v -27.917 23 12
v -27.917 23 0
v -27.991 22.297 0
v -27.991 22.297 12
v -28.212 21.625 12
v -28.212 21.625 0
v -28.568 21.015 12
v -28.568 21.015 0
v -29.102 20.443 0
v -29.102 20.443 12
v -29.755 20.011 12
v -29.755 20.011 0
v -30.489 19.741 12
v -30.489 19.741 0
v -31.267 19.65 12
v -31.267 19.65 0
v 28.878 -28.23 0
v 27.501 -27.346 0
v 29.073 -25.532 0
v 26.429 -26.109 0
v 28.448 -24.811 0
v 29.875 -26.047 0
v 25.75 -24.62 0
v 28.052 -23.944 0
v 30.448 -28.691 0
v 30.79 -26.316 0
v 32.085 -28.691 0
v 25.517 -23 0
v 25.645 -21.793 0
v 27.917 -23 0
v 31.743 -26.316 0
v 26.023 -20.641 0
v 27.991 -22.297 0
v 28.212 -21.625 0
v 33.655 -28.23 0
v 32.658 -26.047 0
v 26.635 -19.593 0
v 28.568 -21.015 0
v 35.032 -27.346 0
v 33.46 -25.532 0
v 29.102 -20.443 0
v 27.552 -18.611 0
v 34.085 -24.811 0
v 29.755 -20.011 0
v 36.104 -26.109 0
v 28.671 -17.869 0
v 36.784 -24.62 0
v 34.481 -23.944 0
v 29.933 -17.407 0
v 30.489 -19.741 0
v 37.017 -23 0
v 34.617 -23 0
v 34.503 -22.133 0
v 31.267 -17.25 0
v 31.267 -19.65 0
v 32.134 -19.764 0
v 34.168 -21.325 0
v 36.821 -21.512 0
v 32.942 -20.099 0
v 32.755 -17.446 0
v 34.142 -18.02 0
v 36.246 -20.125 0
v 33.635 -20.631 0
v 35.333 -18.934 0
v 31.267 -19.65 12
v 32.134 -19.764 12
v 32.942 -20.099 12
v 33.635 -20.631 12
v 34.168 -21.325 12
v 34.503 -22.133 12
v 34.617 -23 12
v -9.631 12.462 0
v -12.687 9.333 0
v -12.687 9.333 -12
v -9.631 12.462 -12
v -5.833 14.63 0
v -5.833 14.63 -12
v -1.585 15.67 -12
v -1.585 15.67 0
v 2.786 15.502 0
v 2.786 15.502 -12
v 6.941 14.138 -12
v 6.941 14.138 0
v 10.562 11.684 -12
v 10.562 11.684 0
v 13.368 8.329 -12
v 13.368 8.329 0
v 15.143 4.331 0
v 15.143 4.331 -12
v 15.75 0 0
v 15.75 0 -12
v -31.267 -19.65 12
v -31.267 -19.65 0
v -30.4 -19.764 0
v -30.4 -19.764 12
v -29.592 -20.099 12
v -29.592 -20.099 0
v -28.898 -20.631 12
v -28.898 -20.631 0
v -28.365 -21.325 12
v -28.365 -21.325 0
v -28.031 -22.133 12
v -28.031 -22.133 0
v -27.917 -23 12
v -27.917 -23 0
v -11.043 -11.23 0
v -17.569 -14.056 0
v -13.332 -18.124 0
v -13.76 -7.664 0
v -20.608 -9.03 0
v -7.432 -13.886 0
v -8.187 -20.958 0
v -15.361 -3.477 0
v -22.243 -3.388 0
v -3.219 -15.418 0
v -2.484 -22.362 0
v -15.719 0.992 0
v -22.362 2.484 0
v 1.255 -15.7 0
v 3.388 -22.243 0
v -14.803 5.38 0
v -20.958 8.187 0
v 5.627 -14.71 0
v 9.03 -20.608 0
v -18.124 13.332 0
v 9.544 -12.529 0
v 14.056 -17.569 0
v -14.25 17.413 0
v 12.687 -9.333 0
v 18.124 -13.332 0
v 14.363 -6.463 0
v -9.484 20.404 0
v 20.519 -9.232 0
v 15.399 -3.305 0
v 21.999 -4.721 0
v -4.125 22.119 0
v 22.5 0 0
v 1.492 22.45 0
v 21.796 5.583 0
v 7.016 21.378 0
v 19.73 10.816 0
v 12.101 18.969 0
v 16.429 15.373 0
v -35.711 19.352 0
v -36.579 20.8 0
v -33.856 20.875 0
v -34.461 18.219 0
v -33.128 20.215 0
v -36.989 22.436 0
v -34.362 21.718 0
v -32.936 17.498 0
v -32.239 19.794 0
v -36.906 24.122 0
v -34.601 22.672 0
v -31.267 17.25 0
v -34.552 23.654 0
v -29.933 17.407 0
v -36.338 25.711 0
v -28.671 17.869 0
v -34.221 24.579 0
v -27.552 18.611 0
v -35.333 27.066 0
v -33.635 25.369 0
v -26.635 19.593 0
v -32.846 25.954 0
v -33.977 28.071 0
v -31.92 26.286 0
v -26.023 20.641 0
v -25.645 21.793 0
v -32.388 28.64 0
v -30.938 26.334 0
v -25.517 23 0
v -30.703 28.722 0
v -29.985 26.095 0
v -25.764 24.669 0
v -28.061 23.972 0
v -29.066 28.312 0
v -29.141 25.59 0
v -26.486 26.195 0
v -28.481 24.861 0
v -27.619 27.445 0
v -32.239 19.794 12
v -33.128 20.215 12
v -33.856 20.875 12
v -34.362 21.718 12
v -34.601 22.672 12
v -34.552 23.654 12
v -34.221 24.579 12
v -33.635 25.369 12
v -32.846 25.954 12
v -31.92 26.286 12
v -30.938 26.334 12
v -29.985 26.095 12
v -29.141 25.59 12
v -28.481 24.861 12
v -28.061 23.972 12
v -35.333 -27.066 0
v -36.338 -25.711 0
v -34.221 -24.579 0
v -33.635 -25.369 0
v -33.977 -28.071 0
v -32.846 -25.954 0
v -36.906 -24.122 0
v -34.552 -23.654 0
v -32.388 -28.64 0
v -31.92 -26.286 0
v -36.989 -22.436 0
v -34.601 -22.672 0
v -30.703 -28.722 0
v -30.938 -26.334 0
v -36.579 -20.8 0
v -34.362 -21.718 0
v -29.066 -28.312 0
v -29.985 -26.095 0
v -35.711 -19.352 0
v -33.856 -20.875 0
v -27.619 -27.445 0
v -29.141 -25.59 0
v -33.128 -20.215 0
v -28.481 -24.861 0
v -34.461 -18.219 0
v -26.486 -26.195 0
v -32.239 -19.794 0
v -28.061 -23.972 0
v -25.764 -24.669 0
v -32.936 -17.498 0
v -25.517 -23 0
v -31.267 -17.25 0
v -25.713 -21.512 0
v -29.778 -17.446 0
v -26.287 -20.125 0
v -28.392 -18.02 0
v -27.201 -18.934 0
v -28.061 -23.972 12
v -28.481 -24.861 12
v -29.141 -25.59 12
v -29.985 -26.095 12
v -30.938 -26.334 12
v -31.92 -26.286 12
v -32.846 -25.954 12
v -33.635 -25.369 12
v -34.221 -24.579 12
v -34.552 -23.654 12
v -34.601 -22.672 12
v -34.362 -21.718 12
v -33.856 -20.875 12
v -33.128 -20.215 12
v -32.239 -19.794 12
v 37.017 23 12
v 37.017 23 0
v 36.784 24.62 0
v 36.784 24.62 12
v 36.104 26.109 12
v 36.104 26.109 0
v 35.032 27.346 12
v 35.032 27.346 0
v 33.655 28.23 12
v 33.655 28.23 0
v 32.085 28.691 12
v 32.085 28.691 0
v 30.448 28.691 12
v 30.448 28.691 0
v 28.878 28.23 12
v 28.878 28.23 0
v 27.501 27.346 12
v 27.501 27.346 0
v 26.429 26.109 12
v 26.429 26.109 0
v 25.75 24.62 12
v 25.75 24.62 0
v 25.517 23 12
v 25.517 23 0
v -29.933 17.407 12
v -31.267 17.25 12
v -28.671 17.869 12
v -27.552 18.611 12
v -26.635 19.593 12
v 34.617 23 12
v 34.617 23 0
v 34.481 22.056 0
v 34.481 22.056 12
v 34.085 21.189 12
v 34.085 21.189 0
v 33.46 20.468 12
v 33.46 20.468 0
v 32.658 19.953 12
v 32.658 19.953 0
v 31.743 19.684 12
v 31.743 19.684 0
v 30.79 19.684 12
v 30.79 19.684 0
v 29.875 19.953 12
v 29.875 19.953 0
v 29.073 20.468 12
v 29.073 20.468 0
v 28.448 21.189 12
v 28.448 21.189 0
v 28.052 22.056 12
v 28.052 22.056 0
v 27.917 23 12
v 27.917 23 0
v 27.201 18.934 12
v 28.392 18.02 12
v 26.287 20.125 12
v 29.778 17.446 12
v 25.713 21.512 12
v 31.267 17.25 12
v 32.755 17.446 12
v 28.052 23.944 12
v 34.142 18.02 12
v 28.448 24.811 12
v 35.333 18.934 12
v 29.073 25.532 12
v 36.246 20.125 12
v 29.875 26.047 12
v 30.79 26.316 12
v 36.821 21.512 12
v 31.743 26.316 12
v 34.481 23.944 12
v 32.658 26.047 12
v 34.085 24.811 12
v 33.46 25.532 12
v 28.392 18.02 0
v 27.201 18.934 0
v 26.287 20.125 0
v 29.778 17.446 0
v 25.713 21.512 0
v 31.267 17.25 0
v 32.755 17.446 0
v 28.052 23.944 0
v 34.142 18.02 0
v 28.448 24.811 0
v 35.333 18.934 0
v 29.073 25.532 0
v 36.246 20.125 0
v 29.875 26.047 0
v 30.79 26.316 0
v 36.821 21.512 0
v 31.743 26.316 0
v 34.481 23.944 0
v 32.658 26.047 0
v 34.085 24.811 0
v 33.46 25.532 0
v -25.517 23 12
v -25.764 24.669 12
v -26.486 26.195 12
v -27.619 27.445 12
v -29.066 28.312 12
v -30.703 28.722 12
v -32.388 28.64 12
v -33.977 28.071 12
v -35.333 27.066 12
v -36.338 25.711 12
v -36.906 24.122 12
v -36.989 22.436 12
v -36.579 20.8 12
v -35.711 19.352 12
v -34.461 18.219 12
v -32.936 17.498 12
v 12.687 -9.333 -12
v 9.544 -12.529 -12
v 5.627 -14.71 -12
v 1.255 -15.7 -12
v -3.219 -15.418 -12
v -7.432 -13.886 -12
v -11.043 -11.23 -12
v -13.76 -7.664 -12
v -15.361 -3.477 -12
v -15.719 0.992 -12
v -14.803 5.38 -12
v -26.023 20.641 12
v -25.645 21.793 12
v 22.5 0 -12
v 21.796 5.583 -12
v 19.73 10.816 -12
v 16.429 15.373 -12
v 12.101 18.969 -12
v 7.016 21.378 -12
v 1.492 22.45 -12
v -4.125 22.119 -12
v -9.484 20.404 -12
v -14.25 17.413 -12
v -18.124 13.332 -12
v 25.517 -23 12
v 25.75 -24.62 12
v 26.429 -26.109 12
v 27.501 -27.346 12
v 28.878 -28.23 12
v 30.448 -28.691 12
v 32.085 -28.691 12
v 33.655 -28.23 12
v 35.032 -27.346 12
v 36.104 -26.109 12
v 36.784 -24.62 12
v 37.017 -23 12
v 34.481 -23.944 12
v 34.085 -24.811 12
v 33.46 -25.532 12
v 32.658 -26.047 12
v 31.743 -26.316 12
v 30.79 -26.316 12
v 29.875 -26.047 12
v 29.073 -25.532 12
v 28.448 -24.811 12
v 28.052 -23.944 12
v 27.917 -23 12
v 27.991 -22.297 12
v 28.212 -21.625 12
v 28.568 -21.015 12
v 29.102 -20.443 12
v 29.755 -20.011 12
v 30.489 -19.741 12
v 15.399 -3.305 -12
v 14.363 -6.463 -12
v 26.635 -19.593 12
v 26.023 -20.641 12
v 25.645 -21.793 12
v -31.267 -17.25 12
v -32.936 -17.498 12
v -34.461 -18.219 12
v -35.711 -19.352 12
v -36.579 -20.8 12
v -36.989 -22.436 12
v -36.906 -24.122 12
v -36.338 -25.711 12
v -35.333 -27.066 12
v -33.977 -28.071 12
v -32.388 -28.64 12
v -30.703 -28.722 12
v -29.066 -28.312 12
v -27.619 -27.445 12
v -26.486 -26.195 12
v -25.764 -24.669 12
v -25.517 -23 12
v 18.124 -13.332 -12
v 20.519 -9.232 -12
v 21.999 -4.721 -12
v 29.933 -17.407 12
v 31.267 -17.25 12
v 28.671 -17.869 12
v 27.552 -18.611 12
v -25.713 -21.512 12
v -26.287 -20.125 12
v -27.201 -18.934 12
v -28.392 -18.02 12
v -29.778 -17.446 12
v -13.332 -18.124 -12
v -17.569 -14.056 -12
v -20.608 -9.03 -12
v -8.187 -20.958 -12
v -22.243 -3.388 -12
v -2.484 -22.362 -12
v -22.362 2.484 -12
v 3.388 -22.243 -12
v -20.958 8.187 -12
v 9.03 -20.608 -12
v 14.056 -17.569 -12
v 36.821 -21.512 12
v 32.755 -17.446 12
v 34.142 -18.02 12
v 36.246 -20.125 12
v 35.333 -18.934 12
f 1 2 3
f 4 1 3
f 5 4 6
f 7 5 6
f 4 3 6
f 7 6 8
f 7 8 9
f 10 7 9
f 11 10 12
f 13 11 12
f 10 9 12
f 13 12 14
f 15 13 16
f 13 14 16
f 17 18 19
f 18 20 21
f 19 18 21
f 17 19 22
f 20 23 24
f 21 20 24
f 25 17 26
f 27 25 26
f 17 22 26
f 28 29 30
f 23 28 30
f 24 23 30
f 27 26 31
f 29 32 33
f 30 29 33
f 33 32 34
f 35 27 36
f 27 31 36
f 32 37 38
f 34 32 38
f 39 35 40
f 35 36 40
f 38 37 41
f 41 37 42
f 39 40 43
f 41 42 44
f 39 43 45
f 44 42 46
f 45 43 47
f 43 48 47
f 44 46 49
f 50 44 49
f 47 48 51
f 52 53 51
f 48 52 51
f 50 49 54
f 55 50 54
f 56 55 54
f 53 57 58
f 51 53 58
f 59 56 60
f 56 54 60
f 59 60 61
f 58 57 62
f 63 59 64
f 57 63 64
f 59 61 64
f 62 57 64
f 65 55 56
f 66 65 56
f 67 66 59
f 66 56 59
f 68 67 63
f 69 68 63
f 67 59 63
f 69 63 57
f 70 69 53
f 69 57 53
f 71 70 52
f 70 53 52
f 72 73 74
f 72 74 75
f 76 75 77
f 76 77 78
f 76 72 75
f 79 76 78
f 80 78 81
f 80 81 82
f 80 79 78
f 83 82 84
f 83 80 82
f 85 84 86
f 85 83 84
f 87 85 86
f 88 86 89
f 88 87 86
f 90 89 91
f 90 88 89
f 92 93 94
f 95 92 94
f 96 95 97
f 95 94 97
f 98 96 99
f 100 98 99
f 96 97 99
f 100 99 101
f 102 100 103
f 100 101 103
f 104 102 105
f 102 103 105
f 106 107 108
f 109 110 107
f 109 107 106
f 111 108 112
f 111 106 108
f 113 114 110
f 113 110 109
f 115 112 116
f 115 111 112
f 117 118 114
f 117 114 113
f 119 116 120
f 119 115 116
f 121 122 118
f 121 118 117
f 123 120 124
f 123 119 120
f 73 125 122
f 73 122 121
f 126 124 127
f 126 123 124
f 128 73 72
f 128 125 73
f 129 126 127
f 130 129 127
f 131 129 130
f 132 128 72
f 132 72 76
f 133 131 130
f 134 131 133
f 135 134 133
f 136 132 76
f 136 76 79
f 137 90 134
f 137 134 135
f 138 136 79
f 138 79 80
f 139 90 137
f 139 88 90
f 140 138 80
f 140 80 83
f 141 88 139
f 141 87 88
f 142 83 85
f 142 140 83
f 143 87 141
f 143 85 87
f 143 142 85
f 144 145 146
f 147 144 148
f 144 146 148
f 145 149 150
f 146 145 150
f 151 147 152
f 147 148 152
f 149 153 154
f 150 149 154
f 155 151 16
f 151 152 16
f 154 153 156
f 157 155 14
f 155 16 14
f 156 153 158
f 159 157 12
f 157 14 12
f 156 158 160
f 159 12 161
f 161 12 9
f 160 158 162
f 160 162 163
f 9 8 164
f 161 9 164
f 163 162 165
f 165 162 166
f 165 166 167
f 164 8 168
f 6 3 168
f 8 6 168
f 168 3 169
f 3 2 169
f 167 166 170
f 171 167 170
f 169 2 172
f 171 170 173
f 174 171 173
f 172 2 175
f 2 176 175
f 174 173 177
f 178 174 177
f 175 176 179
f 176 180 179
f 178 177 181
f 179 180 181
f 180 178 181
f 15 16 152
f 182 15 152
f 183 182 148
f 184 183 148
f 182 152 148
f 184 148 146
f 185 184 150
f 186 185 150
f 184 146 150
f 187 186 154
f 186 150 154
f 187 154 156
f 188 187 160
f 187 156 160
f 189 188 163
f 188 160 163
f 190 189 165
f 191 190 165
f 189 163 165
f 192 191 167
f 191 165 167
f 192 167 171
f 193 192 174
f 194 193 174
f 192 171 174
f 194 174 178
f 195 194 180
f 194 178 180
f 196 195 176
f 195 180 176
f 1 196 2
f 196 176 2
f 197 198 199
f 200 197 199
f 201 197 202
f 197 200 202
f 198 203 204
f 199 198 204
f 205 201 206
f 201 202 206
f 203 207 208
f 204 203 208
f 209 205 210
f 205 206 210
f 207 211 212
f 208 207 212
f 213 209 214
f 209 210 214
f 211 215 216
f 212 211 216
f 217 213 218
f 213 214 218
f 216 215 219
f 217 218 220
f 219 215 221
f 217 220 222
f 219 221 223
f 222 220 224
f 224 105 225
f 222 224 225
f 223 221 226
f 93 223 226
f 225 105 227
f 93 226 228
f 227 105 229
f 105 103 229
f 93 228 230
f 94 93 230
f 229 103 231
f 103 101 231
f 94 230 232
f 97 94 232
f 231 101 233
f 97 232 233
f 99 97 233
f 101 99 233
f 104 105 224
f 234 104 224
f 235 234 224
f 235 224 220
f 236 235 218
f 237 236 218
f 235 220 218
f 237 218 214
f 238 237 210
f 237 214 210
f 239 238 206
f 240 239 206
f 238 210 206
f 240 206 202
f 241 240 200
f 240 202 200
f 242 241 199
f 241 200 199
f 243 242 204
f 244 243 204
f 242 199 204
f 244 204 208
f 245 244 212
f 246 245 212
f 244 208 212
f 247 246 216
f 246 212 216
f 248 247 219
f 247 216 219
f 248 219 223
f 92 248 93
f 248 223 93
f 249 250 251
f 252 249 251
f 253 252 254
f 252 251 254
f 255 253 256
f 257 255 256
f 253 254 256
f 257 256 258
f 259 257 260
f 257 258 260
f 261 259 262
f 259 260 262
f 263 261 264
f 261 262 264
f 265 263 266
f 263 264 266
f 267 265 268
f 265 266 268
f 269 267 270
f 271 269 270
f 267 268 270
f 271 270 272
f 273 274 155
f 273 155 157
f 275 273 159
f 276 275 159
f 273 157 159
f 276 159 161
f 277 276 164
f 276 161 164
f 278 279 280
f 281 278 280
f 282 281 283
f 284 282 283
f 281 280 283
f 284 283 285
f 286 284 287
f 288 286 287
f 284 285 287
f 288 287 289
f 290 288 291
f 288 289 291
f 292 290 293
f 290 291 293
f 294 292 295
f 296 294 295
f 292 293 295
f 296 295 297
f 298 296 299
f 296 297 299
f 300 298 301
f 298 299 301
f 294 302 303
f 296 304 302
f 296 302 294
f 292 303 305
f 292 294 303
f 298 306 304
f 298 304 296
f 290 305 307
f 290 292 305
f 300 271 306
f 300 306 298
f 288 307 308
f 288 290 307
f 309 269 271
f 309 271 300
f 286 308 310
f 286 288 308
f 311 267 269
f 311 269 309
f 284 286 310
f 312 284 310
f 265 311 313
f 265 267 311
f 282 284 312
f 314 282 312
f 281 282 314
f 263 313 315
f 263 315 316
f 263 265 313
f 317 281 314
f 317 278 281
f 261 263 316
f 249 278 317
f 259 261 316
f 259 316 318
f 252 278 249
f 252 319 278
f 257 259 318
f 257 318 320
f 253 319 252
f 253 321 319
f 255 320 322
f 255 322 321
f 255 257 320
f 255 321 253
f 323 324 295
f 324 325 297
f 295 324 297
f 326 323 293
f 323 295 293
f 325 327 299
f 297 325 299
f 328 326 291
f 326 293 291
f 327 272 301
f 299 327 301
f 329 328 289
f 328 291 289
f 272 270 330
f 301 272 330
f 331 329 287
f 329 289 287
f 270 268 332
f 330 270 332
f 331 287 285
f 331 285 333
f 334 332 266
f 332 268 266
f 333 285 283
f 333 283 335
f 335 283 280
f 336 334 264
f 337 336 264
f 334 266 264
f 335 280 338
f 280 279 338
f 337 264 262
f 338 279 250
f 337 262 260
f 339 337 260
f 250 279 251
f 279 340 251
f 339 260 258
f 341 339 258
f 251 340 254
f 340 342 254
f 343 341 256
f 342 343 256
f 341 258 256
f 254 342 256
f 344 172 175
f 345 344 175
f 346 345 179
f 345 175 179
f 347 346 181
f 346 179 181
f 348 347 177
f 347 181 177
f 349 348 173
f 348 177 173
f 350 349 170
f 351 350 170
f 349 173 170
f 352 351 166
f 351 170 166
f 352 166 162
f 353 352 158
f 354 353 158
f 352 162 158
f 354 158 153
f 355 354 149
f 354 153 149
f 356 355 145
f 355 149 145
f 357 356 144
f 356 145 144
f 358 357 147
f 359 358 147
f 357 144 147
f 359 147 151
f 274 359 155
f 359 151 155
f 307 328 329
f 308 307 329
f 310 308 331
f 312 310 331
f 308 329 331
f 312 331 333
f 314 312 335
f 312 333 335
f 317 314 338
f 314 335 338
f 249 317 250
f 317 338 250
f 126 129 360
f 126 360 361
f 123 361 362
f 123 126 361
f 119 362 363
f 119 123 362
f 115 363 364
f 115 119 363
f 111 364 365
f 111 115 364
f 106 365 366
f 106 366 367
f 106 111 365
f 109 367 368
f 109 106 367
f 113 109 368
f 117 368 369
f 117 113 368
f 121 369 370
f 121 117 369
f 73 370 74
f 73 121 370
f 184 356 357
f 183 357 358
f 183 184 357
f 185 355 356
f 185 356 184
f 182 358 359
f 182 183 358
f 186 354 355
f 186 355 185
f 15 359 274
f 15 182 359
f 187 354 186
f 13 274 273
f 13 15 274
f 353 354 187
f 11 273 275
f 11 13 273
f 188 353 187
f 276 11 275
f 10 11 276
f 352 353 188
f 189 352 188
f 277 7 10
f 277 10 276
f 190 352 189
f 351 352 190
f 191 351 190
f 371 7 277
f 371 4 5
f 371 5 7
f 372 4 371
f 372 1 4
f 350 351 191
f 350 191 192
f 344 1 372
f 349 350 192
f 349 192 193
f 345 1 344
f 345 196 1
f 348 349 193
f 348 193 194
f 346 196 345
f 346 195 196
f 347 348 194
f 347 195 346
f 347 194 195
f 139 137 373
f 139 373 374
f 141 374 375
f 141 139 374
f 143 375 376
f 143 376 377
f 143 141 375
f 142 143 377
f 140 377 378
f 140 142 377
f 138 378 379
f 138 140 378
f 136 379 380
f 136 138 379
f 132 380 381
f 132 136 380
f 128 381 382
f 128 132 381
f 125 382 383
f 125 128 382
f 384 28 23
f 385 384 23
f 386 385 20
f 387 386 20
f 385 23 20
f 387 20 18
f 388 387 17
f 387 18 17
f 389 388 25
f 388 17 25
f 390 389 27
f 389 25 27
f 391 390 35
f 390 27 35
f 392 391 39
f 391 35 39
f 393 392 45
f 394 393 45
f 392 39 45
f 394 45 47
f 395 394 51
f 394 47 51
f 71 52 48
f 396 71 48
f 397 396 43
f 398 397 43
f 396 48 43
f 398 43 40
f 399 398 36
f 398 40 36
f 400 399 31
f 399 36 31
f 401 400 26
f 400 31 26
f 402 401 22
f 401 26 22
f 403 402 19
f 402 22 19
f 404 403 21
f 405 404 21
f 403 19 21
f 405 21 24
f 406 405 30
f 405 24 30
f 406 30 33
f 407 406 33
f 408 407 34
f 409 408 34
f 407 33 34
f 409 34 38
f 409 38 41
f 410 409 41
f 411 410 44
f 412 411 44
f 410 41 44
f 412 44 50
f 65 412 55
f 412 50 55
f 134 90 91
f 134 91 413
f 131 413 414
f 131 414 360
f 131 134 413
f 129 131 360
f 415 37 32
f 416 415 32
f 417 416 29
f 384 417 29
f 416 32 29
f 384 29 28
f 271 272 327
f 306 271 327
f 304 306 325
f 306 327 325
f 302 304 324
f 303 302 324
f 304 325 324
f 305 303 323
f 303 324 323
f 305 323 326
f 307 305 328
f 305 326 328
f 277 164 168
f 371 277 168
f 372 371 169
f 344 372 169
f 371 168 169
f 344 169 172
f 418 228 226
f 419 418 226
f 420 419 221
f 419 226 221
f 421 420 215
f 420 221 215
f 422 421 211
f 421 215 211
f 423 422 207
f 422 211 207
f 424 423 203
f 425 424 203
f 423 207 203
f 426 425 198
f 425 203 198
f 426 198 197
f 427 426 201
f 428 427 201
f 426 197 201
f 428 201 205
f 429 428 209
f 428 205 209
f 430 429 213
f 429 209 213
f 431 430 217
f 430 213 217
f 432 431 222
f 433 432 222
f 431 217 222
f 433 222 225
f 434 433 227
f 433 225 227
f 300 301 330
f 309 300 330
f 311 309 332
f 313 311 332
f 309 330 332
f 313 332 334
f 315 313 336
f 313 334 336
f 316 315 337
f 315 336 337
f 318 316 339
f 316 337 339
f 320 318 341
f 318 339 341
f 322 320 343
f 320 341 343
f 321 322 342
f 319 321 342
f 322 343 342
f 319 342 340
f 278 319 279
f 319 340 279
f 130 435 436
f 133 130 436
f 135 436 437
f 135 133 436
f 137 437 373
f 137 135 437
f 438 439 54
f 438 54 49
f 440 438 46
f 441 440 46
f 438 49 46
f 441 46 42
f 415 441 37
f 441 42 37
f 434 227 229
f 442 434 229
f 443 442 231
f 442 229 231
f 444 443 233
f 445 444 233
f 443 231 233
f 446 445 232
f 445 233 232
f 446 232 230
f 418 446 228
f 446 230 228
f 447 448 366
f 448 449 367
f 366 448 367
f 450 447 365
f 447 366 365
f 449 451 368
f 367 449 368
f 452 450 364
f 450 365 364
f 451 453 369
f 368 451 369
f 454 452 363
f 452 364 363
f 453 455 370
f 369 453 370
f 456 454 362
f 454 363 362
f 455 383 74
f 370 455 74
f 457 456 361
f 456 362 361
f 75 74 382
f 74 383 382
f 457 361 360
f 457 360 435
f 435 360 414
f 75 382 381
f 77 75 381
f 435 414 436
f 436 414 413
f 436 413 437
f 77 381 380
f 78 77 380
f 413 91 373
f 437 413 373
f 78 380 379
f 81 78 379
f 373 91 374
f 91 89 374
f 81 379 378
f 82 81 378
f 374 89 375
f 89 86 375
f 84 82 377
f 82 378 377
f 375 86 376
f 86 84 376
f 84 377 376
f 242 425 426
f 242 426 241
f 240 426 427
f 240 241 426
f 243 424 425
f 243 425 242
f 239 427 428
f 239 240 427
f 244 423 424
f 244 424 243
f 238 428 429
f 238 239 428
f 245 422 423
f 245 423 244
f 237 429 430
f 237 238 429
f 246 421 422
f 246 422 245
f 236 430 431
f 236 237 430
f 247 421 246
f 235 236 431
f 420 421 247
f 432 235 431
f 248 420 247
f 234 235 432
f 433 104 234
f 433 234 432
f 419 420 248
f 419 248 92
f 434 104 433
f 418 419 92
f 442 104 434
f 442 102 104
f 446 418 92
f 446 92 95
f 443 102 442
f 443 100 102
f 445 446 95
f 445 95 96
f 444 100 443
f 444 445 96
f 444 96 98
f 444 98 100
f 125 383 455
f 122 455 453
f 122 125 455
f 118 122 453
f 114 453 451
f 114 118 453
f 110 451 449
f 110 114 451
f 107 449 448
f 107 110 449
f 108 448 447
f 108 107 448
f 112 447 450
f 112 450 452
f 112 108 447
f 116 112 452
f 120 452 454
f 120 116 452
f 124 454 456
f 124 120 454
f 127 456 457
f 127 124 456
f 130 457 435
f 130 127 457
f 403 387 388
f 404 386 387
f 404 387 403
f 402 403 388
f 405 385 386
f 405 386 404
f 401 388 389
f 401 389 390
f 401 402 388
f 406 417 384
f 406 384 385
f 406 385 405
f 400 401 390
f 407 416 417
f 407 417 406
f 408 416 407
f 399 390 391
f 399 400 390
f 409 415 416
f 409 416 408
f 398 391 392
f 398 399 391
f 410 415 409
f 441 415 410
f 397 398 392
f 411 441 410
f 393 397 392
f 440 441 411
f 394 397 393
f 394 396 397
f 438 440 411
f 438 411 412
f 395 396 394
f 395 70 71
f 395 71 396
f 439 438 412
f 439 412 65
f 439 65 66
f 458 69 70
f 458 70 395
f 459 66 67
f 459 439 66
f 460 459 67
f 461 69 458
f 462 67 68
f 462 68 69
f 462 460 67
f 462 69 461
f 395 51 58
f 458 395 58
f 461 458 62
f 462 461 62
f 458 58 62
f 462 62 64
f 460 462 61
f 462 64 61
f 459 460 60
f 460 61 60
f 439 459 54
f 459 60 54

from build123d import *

# Parameters (mm, degrees)
F1_DEPTH = 12
F2_DEPTH = 12


with BuildPart() as f1:
    # F0 (on Top) → F1 (new body)
    with BuildSketch(Plane.XY):
        with BuildLine():
            Line((-31.2666631574, -19.65), (-31.2666631574, -17.25))
            ThreePointArc((-31.2666631574, -17.25), (-35.3325271492, -27.0658639918), (-25.5166631574, -23))
            Line((-25.5166631574, -23), (-27.9166631574, -23))
            ThreePointArc((-27.9166631574, -23), (-33.6354708744, -25.368807717), (-31.2666631574, -19.65))
        make_face()
        with BuildLine():
            ThreePointArc((-25.5166631574, -23), (-27.2007991656, -18.9341360082), (-31.2666631574, -17.25))
            Line((-31.2666631574, -17.25), (-31.2666631574, -19.65))
            ThreePointArc((-31.2666631574, -19.65), (-28.8978554405, -20.631192283), (-27.9166631574, -23))
            Line((-27.9166631574, -23), (-25.5166631574, -23))
        make_face()
    extrude(amount=F1_DEPTH)


with BuildPart() as f1b:
    # F0 (on Top) → F1, piece 2 (new body)
    with BuildSketch(Plane.XY):
        with BuildLine():
            ThreePointArc((37.0166631574, 23), (31.2666631574, 28.75), (25.5166631574, 23))
            Line((25.5166631574, 23), (27.9166631574, 23))
            ThreePointArc((27.9166631574, 23), (31.2666631574, 26.35), (34.6166631574, 23))
            ThreePointArc((34.6166631574, 23), (33.6354708744, 20.631192283), (31.2666631574, 19.65))
            Line((31.2666631574, 19.65), (31.2666631574, 17.25))
            ThreePointArc((31.2666631574, 17.25), (35.3325271492, 18.9341360082), (37.0166631574, 23))
        make_face()
        with BuildLine():
            Line((27.9166631574, 23), (25.5166631574, 23))
            ThreePointArc((25.5166631574, 23), (27.2007991656, 18.9341360082), (31.2666631574, 17.25))
            Line((31.2666631574, 17.25), (31.2666631574, 19.65))
            ThreePointArc((31.2666631574, 19.65), (28.8978554405, 20.631192283), (27.9166631574, 23))
        make_face()
    extrude(amount=F1_DEPTH)


with BuildPart() as f1c:
    # F0 (on Top) → F1, piece 3 (new body)
    with BuildSketch(Plane.XY):
        with BuildLine():
            Line((-27.9166631574, 23), (-25.5166631574, 23))
            ThreePointArc((-25.5166631574, 23), (-35.3325271492, 27.0658639918), (-31.2666631574, 17.25))
            Line((-31.2666631574, 17.25), (-31.2666631574, 19.65))
            ThreePointArc((-31.2666631574, 19.65), (-33.6354708744, 25.368807717), (-27.9166631574, 23))
        make_face()
        with BuildLine():
            Line((-31.2666631574, 19.65), (-31.2666631574, 17.25))
            ThreePointArc((-31.2666631574, 17.25), (-28.6713626614, 17.8690239393), (-26.6348632565, 19.5928120572))
            Line((-26.6348632565, 19.5928120572), (-28.5681362586, 21.0149426768))
            ThreePointArc((-28.5681362586, 21.0149426768), (-29.7546185206, 20.0106487298), (-31.2666631574, 19.65))
        make_face()
        with BuildLine():
            ThreePointArc((-26.6348632565, 19.5928120572), (-25.8033606109, 21.2070066133), (-25.5166631574, 23))
            Line((-25.5166631574, 23), (-27.9166631574, 23))
            ThreePointArc((-27.9166631574, 23), (-28.0836955868, 21.9553864617), (-28.5681362586, 21.0149426768))
            Line((-28.5681362586, 21.0149426768), (-26.6348632565, 19.5928120572))
        make_face()
    extrude(amount=F1_DEPTH)


with BuildPart() as f1d:
    # F0 (on Top) → F1, piece 4 (new body)
    with BuildSketch(Plane.XY):
        with BuildLine():
            ThreePointArc((37.0166631574, -23), (35.3325271492, -18.9341360082), (31.2666631574, -17.25))
            Line((31.2666631574, -17.25), (31.2666631574, -19.65))
            ThreePointArc((31.2666631574, -19.65), (33.6354708744, -20.631192283), (34.6166631574, -23))
            ThreePointArc((34.6166631574, -23), (31.2666631574, -26.35), (27.9166631574, -23))
            Line((27.9166631574, -23), (25.5166631574, -23))
            ThreePointArc((25.5166631574, -23), (31.2666631574, -28.75), (37.0166631574, -23))
        make_face()
        with BuildLine():
            Line((31.2666631574, -19.65), (31.2666631574, -17.25))
            ThreePointArc((31.2666631574, -17.25), (28.6713626614, -17.8690239393), (26.6348632565, -19.5928120572))
            Line((26.6348632565, -19.5928120572), (28.5681362586, -21.0149426768))
            ThreePointArc((28.5681362586, -21.0149426768), (29.7546185206, -20.0106487298), (31.2666631574, -19.65))
        make_face()
        with BuildLine():
            ThreePointArc((26.6348632565, -19.5928120572), (25.8033606109, -21.2070066133), (25.5166631574, -23))
            Line((25.5166631574, -23), (27.9166631574, -23))
            ThreePointArc((27.9166631574, -23), (28.0836955868, -21.9553864617), (28.5681362586, -21.0149426768))
            Line((28.5681362586, -21.0149426768), (26.6348632565, -19.5928120572))
        make_face()
    extrude(amount=F1_DEPTH)


with BuildPart() as f2:
    # F0 (on Top) → F2 (new body)
    with BuildSketch(Plane.XY):
        with BuildLine():
            ThreePointArc((22.5, 0), (7.0160610784, 21.3781403996), (-18.124434395, 13.3324745588))
            Line((-18.124434395, 13.3324745588), (-12.6871040765, 9.3327321912))
            ThreePointArc((-12.6871040765, 9.3327321912), (4.9112427549, 14.9646982797), (15.75, 0))
            ThreePointArc((15.75, 0), (14.9646982797, -4.9112427549), (12.6871040765, -9.3327321912))
            Line((12.6871040765, -9.3327321912), (18.124434395, -13.3324745588))
            ThreePointArc((18.124434395, -13.3324745588), (21.3781403996, -7.0160610784), (22.5, 0))
        make_face()
        with BuildLine():
            Line((-12.6871040765, 9.3327321912), (-18.124434395, 13.3324745588))
            ThreePointArc((-18.124434395, 13.3324745588), (-13.3324745588, -18.124434395), (18.124434395, -13.3324745588))
            Line((18.124434395, -13.3324745588), (12.6871040765, -9.3327321912))
            ThreePointArc((12.6871040765, -9.3327321912), (-9.3327321912, -12.6871040765), (-12.6871040765, 9.3327321912))
        make_face()
    extrude(amount=-F2_DEPTH)


solid = Compound([f1.part, f1b.part, f1c.part, f1d.part, f2.part])
